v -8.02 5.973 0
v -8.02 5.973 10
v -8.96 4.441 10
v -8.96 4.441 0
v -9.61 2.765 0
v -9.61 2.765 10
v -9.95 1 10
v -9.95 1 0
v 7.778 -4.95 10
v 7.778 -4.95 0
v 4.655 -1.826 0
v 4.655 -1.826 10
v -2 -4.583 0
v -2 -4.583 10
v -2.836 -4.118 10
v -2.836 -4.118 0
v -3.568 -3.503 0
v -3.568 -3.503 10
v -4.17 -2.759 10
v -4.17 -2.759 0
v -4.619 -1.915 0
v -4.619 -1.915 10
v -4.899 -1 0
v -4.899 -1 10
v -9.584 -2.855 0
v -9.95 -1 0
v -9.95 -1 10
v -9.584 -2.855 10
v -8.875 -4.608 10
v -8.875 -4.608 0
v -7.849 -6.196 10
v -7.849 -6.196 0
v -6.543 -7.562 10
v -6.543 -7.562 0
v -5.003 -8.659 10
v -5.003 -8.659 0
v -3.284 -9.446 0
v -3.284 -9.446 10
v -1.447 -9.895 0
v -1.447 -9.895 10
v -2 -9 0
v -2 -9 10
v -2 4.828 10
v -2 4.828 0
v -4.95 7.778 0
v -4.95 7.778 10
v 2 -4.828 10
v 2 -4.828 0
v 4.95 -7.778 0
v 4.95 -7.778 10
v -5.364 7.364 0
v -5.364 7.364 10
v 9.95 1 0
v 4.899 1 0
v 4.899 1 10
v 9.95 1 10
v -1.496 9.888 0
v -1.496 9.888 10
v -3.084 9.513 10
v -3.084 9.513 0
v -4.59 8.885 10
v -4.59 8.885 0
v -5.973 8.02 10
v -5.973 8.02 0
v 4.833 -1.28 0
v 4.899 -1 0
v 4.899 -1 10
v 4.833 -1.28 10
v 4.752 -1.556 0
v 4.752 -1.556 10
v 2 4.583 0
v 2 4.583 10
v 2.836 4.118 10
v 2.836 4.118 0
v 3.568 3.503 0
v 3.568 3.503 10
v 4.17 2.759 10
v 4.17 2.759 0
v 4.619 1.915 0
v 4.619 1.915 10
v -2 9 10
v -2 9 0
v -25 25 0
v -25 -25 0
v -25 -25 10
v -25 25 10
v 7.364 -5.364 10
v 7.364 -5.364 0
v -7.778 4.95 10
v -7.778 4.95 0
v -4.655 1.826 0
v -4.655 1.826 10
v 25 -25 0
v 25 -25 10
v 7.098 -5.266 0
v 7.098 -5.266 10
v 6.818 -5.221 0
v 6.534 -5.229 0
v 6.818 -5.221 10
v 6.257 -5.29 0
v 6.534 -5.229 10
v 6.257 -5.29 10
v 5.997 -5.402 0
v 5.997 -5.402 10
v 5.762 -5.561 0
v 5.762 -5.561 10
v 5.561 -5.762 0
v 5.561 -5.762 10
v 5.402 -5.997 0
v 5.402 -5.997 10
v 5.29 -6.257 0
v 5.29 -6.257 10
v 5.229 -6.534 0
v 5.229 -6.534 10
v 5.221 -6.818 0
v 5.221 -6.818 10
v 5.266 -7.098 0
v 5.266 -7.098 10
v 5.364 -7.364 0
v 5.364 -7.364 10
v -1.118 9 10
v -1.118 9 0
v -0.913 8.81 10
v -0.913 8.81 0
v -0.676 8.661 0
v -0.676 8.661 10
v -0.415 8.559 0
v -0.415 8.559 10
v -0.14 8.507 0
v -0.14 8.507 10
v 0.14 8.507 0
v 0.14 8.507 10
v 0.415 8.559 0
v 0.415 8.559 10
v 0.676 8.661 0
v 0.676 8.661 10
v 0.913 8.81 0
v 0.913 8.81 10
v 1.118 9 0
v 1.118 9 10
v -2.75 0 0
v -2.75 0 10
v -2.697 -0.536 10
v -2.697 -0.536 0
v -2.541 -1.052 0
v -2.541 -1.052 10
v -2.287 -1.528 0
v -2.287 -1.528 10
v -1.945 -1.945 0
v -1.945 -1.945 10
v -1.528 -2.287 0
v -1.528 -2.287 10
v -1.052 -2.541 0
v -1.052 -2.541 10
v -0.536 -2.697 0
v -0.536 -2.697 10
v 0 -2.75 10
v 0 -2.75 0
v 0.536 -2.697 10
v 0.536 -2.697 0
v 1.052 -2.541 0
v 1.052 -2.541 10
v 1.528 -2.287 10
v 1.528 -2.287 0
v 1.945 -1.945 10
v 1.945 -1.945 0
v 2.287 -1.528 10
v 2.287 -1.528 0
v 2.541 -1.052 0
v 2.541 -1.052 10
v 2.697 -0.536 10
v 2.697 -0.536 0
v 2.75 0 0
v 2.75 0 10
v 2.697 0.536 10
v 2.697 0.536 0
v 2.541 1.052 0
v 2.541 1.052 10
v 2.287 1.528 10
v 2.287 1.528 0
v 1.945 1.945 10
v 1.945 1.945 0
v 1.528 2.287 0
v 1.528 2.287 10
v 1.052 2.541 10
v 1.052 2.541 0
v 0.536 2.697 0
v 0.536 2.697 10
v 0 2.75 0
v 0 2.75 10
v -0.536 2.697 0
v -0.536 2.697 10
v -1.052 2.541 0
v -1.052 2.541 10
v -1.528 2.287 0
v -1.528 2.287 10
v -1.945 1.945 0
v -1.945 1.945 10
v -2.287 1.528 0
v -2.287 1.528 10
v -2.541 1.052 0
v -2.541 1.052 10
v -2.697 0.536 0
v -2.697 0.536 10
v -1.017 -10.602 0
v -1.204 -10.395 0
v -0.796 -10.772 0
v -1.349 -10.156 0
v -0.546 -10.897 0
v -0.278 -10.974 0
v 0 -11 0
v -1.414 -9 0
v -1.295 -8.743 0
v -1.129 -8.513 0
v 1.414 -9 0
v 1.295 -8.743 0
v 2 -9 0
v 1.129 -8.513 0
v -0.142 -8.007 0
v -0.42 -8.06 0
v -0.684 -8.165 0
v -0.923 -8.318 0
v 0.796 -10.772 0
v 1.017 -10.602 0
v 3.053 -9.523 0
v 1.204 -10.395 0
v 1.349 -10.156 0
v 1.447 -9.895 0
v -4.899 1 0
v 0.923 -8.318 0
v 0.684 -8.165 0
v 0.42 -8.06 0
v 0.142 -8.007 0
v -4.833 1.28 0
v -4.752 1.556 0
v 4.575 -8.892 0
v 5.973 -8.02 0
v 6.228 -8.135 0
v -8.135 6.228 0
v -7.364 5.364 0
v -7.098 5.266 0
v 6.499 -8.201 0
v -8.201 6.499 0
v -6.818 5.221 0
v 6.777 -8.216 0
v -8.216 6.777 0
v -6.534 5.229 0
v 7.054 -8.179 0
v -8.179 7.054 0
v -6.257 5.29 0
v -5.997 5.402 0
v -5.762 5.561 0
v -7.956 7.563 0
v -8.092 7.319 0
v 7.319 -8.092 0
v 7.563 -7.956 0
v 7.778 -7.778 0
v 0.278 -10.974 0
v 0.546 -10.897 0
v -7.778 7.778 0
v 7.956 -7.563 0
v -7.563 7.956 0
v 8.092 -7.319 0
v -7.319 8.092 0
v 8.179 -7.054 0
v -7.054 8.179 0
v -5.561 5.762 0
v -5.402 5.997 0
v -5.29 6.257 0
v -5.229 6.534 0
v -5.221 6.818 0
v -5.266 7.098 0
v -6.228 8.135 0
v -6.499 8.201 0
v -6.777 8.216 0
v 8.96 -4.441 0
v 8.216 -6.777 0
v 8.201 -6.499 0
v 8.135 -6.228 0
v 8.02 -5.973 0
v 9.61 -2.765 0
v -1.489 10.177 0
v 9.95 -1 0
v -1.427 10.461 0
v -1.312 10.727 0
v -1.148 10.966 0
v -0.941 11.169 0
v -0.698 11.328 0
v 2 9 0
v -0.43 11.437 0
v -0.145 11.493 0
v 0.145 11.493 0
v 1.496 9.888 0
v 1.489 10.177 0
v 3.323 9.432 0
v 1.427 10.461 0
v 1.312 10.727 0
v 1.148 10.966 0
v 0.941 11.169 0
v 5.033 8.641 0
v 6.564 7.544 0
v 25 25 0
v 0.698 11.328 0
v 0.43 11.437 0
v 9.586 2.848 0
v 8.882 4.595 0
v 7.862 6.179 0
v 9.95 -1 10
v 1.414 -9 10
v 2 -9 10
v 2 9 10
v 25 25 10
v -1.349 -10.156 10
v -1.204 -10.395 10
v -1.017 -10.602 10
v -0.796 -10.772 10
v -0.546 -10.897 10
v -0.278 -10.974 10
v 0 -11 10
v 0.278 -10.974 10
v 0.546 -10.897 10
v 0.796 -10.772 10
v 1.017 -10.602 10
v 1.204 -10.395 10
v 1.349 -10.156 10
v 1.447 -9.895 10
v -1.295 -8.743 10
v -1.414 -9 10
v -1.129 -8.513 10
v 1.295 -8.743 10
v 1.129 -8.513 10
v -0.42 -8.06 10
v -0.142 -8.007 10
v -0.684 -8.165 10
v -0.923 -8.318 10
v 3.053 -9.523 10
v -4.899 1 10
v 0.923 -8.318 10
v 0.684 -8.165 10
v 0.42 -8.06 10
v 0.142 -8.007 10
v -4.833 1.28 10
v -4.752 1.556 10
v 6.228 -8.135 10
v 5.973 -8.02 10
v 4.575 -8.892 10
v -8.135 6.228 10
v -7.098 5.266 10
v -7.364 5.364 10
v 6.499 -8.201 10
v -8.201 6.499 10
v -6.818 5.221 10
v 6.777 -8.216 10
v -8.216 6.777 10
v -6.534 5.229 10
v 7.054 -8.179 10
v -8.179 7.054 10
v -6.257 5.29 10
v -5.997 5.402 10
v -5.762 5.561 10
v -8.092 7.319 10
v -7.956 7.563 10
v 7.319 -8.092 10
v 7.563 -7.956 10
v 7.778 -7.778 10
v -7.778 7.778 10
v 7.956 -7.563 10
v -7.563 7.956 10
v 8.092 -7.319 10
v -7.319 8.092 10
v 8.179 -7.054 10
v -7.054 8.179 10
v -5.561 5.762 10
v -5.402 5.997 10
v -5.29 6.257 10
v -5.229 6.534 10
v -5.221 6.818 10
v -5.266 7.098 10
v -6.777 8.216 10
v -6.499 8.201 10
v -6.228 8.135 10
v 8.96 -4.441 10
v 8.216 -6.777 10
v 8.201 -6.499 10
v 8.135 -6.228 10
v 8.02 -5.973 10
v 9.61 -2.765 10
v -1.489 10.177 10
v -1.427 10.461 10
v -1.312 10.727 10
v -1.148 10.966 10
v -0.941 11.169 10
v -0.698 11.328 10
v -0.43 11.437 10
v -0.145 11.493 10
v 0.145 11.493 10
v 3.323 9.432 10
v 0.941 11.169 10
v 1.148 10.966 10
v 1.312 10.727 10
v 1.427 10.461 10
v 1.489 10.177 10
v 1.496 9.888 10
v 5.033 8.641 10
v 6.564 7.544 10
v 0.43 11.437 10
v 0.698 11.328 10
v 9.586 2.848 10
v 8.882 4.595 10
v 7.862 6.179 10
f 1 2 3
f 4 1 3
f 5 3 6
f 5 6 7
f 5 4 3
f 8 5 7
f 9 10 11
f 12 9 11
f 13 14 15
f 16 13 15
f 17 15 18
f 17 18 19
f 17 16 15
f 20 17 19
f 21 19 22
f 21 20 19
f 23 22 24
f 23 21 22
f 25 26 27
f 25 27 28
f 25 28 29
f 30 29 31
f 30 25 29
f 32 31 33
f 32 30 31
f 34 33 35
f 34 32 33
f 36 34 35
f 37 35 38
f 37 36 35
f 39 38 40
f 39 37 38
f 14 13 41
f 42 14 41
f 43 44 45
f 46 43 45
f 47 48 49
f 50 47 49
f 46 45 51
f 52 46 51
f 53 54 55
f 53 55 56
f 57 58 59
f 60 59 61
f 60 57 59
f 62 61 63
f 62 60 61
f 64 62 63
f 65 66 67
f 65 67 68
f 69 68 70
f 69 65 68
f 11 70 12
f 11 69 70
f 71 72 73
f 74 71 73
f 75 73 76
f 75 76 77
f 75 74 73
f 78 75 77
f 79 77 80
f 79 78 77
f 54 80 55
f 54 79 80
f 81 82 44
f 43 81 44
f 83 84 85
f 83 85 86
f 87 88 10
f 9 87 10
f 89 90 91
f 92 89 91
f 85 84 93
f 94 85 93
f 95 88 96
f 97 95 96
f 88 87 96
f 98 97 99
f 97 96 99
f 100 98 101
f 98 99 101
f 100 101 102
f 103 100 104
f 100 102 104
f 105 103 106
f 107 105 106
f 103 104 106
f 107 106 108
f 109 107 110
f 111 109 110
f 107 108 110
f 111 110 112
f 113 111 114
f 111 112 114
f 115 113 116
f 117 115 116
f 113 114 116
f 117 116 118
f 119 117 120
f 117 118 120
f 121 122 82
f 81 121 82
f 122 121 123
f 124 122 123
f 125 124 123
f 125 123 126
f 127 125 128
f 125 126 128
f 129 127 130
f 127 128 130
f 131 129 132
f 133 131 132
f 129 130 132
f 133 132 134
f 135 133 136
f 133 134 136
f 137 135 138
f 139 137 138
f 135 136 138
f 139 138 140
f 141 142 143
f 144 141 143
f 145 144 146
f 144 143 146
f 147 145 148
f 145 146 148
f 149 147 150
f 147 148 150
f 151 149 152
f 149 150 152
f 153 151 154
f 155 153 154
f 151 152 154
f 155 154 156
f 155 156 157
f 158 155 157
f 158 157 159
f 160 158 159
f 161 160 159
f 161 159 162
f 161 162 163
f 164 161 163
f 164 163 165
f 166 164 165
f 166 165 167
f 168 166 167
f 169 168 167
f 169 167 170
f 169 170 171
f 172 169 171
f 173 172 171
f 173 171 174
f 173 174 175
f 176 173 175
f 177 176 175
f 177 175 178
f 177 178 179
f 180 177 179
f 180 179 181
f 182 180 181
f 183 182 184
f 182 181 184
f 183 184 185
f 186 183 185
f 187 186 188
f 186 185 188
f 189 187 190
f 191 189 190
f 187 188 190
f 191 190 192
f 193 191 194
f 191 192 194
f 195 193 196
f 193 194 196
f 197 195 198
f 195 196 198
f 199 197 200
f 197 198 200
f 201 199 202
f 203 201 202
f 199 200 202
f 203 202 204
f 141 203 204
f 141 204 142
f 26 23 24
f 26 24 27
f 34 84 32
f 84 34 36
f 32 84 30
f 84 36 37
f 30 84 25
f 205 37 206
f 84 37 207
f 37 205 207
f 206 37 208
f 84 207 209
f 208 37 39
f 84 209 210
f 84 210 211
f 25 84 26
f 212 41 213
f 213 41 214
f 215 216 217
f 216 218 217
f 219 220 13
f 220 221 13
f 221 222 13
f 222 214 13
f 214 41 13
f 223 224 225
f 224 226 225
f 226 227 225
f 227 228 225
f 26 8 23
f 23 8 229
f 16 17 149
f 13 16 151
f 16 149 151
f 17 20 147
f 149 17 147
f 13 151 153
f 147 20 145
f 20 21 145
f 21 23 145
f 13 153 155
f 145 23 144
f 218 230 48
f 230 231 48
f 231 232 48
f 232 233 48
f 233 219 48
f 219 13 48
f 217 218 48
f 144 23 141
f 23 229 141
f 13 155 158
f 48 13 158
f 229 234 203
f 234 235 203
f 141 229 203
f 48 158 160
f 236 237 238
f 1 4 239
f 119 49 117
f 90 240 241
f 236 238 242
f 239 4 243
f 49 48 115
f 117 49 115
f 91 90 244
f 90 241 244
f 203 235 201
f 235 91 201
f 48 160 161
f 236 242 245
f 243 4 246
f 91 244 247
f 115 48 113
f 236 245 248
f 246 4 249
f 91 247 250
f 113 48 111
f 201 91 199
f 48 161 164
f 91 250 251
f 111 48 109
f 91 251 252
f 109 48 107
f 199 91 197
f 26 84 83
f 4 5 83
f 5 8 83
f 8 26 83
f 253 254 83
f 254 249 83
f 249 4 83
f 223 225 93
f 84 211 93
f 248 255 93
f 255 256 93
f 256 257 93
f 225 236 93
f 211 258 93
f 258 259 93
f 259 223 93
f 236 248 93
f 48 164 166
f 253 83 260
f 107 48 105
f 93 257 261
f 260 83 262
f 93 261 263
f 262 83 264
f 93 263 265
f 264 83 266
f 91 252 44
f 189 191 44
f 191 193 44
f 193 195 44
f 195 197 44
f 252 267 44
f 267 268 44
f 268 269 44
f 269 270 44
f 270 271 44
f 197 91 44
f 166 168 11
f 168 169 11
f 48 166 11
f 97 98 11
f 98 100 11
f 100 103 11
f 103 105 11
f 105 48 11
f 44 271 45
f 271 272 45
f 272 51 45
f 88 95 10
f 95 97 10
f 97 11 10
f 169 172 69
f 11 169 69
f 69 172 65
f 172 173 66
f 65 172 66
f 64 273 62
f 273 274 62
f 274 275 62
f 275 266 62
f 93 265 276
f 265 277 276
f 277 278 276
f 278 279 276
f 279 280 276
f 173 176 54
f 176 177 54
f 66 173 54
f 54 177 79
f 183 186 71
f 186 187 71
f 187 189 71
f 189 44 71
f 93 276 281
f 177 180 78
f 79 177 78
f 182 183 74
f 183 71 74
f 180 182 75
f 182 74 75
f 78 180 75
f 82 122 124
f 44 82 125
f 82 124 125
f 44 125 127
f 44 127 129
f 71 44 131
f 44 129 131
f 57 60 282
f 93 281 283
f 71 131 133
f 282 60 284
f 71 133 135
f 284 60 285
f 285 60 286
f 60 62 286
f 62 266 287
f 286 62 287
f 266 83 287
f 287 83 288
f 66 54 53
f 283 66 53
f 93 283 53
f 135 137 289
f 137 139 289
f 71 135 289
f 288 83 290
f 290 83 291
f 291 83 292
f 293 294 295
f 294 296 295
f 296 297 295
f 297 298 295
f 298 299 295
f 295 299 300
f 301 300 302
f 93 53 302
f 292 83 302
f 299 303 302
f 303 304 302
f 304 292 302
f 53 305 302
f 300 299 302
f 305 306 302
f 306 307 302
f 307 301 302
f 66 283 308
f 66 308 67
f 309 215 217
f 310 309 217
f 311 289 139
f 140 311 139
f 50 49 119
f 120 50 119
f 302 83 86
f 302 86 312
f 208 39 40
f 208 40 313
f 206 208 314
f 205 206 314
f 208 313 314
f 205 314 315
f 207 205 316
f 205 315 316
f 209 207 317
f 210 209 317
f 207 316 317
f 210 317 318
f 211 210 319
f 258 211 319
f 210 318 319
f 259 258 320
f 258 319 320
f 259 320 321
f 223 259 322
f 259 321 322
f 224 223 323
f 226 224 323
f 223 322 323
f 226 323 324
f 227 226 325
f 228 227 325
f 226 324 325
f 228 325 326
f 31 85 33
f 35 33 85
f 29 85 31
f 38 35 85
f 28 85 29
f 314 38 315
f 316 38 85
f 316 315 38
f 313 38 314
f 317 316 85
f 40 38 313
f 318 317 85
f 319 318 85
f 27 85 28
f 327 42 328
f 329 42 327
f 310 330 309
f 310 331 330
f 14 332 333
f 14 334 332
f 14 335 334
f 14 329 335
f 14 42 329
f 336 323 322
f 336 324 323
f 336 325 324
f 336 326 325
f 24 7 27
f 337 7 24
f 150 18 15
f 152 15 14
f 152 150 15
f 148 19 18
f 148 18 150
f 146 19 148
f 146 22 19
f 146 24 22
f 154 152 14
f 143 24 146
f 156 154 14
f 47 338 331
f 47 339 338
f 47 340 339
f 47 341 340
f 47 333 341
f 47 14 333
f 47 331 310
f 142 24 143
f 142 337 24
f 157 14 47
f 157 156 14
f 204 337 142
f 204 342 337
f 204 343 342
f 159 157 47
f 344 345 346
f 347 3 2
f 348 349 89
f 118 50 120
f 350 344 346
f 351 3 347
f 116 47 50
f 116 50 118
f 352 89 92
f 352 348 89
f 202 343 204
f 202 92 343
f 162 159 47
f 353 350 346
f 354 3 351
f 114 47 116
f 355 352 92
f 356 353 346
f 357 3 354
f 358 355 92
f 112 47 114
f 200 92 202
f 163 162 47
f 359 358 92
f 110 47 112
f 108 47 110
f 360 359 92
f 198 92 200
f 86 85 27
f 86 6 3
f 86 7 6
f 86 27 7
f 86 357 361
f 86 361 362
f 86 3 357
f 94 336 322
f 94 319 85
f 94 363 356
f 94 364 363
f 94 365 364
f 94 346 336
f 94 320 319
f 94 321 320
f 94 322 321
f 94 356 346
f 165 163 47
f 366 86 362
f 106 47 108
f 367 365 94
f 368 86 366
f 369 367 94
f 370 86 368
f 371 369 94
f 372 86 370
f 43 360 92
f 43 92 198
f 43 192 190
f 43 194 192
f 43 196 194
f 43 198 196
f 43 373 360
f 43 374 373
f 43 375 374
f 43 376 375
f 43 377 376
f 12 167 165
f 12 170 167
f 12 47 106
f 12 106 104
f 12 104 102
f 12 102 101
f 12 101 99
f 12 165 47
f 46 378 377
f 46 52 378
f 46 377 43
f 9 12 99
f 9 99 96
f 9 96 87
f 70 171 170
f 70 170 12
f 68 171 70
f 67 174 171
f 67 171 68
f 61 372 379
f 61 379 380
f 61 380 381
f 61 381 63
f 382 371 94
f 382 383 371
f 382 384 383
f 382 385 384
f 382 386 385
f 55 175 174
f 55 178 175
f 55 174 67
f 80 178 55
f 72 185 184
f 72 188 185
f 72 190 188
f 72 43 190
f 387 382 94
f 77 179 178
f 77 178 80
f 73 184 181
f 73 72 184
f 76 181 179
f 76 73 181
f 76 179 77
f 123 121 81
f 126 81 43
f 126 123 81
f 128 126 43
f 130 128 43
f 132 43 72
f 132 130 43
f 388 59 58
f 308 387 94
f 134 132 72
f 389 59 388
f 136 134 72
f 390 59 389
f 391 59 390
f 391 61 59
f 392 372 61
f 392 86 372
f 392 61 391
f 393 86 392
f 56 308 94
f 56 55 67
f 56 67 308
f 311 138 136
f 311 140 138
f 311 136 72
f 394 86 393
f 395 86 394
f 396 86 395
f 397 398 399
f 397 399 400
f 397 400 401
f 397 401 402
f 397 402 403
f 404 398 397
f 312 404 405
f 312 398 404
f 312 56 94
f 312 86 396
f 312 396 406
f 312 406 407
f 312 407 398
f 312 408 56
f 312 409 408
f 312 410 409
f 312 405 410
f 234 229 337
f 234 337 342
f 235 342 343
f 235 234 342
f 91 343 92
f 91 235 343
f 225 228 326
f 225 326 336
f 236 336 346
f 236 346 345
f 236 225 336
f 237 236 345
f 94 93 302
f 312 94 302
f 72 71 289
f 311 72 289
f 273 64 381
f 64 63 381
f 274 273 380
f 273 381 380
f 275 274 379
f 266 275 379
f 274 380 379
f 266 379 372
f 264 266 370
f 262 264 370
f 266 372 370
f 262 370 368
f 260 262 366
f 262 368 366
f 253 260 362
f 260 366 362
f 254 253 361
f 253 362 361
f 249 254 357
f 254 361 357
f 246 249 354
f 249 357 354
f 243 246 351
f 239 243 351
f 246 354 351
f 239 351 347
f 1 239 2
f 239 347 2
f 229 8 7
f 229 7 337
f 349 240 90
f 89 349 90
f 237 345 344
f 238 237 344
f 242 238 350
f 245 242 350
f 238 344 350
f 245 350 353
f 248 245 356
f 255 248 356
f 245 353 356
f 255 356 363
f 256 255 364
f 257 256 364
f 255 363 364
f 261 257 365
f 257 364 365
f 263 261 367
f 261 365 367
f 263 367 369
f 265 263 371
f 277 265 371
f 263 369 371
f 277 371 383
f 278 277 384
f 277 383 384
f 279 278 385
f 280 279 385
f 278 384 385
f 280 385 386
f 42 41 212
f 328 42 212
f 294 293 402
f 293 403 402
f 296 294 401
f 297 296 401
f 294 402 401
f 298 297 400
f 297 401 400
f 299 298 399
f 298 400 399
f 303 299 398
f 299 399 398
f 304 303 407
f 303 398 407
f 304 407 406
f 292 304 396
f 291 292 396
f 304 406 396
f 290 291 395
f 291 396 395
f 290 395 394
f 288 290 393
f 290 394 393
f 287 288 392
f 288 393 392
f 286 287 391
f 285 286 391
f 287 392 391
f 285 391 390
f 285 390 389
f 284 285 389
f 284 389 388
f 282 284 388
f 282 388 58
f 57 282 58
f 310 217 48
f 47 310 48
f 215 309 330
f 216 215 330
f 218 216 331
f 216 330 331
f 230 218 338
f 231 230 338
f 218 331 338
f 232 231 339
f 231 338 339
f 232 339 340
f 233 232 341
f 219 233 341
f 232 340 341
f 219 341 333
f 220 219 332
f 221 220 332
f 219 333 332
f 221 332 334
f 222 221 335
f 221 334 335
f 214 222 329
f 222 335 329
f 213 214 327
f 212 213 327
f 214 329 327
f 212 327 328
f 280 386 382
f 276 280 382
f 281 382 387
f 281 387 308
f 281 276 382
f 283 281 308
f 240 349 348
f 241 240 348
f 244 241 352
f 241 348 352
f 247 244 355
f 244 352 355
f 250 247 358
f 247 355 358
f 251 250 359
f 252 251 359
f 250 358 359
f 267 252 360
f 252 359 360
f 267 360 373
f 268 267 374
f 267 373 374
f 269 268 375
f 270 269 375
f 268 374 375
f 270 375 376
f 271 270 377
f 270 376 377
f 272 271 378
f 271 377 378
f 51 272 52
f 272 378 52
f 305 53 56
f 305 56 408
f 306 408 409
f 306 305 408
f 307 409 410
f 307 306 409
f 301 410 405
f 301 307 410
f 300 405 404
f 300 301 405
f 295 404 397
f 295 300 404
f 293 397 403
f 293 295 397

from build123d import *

# Parameters (mm, degrees)
F0_W     = 50
F0_H     = 50
F1_DEPTH = 10
F3_DEPTH = 10
F5_DEPTH = 10
F7_D     = 5.5
F8_D     = 3


with BuildPart() as f1:
    # F0 (on Top) → F1 (new body)
    with BuildSketch(Plane.XY):
        Rectangle(F0_W, F0_H)
    extrude(amount=F1_DEPTH)

    # F2 (on Top) → F3 (cut, through all)
    with BuildSketch(Plane.XY):
        with BuildLine():
            Line((-4.8989794856, -1), (-9.9498743711, -1))
            ThreePointArc((-9.9498743711, -1), (0, -10), (9.9498743711, -1))
            Line((9.9498743711, -1), (4.8989794856, -1))
            ThreePointArc((4.8989794856, -1), (0, -5), (-4.8989794856, -1))
        make_face()
        with BuildLine():
            ThreePointArc((9.9498743711, 1), (0, 10), (-9.9498743711, 1))
            Line((-9.9498743711, 1), (-4.8989794856, 1))
            ThreePointArc((-4.8989794856, 1), (0, 5), (4.8989794856, 1))
            Line((4.8989794856, 1), (9.9498743711, 1))
        make_face()
    extrude(amount=F3_DEPTH, mode=Mode.SUBTRACT)

    # F4 (on Top) → F5 (join)
    with BuildSketch(Plane.XY):
        Polygon((2, 9), (-2, 9), (-2, 4.8284271247), (2, 0.8284271247), align=None)
        Polygon((2, 0.8284271247), (-2, 4.8284271247), (-2, -0.8284271247), (2, -4.8284271247), align=None)
        Polygon((-2, -0.8284271247), (-2, 4.8284271247), (-4.9497474683, 7.7781745931), (-7.7781745931, 4.9497474683), align=None)
        Polygon((7.7781745931, -4.9497474683), (2, 0.8284271247), (2, -4.8284271247), (4.9497474683, -7.7781745931), align=None)
        Polygon((2, -4.8284271247), (-2, -0.8284271247), (-2, -9), (2, -9), align=None)
    extrude(amount=F5_DEPTH)

    # F7 (through all)
    with Locations(Plane(origin=(0, 0, 0), x_dir=(1, 0, 0), z_dir=(0, 0, -1))):
        with Locations((0, 0)):
            Hole(F7_D / 2)

    # F8 (through all)
    with Locations(Plane(origin=(0, 0, 0), x_dir=(1, 0, 0), z_dir=(0, 0, -1))):
        with Locations((-6.7175144213, -6.7175144213), (0, -10), (0, 9.5), (6.7175144213, 6.7175144213)):
            Hole(F8_D / 2)


solid = f1.part
